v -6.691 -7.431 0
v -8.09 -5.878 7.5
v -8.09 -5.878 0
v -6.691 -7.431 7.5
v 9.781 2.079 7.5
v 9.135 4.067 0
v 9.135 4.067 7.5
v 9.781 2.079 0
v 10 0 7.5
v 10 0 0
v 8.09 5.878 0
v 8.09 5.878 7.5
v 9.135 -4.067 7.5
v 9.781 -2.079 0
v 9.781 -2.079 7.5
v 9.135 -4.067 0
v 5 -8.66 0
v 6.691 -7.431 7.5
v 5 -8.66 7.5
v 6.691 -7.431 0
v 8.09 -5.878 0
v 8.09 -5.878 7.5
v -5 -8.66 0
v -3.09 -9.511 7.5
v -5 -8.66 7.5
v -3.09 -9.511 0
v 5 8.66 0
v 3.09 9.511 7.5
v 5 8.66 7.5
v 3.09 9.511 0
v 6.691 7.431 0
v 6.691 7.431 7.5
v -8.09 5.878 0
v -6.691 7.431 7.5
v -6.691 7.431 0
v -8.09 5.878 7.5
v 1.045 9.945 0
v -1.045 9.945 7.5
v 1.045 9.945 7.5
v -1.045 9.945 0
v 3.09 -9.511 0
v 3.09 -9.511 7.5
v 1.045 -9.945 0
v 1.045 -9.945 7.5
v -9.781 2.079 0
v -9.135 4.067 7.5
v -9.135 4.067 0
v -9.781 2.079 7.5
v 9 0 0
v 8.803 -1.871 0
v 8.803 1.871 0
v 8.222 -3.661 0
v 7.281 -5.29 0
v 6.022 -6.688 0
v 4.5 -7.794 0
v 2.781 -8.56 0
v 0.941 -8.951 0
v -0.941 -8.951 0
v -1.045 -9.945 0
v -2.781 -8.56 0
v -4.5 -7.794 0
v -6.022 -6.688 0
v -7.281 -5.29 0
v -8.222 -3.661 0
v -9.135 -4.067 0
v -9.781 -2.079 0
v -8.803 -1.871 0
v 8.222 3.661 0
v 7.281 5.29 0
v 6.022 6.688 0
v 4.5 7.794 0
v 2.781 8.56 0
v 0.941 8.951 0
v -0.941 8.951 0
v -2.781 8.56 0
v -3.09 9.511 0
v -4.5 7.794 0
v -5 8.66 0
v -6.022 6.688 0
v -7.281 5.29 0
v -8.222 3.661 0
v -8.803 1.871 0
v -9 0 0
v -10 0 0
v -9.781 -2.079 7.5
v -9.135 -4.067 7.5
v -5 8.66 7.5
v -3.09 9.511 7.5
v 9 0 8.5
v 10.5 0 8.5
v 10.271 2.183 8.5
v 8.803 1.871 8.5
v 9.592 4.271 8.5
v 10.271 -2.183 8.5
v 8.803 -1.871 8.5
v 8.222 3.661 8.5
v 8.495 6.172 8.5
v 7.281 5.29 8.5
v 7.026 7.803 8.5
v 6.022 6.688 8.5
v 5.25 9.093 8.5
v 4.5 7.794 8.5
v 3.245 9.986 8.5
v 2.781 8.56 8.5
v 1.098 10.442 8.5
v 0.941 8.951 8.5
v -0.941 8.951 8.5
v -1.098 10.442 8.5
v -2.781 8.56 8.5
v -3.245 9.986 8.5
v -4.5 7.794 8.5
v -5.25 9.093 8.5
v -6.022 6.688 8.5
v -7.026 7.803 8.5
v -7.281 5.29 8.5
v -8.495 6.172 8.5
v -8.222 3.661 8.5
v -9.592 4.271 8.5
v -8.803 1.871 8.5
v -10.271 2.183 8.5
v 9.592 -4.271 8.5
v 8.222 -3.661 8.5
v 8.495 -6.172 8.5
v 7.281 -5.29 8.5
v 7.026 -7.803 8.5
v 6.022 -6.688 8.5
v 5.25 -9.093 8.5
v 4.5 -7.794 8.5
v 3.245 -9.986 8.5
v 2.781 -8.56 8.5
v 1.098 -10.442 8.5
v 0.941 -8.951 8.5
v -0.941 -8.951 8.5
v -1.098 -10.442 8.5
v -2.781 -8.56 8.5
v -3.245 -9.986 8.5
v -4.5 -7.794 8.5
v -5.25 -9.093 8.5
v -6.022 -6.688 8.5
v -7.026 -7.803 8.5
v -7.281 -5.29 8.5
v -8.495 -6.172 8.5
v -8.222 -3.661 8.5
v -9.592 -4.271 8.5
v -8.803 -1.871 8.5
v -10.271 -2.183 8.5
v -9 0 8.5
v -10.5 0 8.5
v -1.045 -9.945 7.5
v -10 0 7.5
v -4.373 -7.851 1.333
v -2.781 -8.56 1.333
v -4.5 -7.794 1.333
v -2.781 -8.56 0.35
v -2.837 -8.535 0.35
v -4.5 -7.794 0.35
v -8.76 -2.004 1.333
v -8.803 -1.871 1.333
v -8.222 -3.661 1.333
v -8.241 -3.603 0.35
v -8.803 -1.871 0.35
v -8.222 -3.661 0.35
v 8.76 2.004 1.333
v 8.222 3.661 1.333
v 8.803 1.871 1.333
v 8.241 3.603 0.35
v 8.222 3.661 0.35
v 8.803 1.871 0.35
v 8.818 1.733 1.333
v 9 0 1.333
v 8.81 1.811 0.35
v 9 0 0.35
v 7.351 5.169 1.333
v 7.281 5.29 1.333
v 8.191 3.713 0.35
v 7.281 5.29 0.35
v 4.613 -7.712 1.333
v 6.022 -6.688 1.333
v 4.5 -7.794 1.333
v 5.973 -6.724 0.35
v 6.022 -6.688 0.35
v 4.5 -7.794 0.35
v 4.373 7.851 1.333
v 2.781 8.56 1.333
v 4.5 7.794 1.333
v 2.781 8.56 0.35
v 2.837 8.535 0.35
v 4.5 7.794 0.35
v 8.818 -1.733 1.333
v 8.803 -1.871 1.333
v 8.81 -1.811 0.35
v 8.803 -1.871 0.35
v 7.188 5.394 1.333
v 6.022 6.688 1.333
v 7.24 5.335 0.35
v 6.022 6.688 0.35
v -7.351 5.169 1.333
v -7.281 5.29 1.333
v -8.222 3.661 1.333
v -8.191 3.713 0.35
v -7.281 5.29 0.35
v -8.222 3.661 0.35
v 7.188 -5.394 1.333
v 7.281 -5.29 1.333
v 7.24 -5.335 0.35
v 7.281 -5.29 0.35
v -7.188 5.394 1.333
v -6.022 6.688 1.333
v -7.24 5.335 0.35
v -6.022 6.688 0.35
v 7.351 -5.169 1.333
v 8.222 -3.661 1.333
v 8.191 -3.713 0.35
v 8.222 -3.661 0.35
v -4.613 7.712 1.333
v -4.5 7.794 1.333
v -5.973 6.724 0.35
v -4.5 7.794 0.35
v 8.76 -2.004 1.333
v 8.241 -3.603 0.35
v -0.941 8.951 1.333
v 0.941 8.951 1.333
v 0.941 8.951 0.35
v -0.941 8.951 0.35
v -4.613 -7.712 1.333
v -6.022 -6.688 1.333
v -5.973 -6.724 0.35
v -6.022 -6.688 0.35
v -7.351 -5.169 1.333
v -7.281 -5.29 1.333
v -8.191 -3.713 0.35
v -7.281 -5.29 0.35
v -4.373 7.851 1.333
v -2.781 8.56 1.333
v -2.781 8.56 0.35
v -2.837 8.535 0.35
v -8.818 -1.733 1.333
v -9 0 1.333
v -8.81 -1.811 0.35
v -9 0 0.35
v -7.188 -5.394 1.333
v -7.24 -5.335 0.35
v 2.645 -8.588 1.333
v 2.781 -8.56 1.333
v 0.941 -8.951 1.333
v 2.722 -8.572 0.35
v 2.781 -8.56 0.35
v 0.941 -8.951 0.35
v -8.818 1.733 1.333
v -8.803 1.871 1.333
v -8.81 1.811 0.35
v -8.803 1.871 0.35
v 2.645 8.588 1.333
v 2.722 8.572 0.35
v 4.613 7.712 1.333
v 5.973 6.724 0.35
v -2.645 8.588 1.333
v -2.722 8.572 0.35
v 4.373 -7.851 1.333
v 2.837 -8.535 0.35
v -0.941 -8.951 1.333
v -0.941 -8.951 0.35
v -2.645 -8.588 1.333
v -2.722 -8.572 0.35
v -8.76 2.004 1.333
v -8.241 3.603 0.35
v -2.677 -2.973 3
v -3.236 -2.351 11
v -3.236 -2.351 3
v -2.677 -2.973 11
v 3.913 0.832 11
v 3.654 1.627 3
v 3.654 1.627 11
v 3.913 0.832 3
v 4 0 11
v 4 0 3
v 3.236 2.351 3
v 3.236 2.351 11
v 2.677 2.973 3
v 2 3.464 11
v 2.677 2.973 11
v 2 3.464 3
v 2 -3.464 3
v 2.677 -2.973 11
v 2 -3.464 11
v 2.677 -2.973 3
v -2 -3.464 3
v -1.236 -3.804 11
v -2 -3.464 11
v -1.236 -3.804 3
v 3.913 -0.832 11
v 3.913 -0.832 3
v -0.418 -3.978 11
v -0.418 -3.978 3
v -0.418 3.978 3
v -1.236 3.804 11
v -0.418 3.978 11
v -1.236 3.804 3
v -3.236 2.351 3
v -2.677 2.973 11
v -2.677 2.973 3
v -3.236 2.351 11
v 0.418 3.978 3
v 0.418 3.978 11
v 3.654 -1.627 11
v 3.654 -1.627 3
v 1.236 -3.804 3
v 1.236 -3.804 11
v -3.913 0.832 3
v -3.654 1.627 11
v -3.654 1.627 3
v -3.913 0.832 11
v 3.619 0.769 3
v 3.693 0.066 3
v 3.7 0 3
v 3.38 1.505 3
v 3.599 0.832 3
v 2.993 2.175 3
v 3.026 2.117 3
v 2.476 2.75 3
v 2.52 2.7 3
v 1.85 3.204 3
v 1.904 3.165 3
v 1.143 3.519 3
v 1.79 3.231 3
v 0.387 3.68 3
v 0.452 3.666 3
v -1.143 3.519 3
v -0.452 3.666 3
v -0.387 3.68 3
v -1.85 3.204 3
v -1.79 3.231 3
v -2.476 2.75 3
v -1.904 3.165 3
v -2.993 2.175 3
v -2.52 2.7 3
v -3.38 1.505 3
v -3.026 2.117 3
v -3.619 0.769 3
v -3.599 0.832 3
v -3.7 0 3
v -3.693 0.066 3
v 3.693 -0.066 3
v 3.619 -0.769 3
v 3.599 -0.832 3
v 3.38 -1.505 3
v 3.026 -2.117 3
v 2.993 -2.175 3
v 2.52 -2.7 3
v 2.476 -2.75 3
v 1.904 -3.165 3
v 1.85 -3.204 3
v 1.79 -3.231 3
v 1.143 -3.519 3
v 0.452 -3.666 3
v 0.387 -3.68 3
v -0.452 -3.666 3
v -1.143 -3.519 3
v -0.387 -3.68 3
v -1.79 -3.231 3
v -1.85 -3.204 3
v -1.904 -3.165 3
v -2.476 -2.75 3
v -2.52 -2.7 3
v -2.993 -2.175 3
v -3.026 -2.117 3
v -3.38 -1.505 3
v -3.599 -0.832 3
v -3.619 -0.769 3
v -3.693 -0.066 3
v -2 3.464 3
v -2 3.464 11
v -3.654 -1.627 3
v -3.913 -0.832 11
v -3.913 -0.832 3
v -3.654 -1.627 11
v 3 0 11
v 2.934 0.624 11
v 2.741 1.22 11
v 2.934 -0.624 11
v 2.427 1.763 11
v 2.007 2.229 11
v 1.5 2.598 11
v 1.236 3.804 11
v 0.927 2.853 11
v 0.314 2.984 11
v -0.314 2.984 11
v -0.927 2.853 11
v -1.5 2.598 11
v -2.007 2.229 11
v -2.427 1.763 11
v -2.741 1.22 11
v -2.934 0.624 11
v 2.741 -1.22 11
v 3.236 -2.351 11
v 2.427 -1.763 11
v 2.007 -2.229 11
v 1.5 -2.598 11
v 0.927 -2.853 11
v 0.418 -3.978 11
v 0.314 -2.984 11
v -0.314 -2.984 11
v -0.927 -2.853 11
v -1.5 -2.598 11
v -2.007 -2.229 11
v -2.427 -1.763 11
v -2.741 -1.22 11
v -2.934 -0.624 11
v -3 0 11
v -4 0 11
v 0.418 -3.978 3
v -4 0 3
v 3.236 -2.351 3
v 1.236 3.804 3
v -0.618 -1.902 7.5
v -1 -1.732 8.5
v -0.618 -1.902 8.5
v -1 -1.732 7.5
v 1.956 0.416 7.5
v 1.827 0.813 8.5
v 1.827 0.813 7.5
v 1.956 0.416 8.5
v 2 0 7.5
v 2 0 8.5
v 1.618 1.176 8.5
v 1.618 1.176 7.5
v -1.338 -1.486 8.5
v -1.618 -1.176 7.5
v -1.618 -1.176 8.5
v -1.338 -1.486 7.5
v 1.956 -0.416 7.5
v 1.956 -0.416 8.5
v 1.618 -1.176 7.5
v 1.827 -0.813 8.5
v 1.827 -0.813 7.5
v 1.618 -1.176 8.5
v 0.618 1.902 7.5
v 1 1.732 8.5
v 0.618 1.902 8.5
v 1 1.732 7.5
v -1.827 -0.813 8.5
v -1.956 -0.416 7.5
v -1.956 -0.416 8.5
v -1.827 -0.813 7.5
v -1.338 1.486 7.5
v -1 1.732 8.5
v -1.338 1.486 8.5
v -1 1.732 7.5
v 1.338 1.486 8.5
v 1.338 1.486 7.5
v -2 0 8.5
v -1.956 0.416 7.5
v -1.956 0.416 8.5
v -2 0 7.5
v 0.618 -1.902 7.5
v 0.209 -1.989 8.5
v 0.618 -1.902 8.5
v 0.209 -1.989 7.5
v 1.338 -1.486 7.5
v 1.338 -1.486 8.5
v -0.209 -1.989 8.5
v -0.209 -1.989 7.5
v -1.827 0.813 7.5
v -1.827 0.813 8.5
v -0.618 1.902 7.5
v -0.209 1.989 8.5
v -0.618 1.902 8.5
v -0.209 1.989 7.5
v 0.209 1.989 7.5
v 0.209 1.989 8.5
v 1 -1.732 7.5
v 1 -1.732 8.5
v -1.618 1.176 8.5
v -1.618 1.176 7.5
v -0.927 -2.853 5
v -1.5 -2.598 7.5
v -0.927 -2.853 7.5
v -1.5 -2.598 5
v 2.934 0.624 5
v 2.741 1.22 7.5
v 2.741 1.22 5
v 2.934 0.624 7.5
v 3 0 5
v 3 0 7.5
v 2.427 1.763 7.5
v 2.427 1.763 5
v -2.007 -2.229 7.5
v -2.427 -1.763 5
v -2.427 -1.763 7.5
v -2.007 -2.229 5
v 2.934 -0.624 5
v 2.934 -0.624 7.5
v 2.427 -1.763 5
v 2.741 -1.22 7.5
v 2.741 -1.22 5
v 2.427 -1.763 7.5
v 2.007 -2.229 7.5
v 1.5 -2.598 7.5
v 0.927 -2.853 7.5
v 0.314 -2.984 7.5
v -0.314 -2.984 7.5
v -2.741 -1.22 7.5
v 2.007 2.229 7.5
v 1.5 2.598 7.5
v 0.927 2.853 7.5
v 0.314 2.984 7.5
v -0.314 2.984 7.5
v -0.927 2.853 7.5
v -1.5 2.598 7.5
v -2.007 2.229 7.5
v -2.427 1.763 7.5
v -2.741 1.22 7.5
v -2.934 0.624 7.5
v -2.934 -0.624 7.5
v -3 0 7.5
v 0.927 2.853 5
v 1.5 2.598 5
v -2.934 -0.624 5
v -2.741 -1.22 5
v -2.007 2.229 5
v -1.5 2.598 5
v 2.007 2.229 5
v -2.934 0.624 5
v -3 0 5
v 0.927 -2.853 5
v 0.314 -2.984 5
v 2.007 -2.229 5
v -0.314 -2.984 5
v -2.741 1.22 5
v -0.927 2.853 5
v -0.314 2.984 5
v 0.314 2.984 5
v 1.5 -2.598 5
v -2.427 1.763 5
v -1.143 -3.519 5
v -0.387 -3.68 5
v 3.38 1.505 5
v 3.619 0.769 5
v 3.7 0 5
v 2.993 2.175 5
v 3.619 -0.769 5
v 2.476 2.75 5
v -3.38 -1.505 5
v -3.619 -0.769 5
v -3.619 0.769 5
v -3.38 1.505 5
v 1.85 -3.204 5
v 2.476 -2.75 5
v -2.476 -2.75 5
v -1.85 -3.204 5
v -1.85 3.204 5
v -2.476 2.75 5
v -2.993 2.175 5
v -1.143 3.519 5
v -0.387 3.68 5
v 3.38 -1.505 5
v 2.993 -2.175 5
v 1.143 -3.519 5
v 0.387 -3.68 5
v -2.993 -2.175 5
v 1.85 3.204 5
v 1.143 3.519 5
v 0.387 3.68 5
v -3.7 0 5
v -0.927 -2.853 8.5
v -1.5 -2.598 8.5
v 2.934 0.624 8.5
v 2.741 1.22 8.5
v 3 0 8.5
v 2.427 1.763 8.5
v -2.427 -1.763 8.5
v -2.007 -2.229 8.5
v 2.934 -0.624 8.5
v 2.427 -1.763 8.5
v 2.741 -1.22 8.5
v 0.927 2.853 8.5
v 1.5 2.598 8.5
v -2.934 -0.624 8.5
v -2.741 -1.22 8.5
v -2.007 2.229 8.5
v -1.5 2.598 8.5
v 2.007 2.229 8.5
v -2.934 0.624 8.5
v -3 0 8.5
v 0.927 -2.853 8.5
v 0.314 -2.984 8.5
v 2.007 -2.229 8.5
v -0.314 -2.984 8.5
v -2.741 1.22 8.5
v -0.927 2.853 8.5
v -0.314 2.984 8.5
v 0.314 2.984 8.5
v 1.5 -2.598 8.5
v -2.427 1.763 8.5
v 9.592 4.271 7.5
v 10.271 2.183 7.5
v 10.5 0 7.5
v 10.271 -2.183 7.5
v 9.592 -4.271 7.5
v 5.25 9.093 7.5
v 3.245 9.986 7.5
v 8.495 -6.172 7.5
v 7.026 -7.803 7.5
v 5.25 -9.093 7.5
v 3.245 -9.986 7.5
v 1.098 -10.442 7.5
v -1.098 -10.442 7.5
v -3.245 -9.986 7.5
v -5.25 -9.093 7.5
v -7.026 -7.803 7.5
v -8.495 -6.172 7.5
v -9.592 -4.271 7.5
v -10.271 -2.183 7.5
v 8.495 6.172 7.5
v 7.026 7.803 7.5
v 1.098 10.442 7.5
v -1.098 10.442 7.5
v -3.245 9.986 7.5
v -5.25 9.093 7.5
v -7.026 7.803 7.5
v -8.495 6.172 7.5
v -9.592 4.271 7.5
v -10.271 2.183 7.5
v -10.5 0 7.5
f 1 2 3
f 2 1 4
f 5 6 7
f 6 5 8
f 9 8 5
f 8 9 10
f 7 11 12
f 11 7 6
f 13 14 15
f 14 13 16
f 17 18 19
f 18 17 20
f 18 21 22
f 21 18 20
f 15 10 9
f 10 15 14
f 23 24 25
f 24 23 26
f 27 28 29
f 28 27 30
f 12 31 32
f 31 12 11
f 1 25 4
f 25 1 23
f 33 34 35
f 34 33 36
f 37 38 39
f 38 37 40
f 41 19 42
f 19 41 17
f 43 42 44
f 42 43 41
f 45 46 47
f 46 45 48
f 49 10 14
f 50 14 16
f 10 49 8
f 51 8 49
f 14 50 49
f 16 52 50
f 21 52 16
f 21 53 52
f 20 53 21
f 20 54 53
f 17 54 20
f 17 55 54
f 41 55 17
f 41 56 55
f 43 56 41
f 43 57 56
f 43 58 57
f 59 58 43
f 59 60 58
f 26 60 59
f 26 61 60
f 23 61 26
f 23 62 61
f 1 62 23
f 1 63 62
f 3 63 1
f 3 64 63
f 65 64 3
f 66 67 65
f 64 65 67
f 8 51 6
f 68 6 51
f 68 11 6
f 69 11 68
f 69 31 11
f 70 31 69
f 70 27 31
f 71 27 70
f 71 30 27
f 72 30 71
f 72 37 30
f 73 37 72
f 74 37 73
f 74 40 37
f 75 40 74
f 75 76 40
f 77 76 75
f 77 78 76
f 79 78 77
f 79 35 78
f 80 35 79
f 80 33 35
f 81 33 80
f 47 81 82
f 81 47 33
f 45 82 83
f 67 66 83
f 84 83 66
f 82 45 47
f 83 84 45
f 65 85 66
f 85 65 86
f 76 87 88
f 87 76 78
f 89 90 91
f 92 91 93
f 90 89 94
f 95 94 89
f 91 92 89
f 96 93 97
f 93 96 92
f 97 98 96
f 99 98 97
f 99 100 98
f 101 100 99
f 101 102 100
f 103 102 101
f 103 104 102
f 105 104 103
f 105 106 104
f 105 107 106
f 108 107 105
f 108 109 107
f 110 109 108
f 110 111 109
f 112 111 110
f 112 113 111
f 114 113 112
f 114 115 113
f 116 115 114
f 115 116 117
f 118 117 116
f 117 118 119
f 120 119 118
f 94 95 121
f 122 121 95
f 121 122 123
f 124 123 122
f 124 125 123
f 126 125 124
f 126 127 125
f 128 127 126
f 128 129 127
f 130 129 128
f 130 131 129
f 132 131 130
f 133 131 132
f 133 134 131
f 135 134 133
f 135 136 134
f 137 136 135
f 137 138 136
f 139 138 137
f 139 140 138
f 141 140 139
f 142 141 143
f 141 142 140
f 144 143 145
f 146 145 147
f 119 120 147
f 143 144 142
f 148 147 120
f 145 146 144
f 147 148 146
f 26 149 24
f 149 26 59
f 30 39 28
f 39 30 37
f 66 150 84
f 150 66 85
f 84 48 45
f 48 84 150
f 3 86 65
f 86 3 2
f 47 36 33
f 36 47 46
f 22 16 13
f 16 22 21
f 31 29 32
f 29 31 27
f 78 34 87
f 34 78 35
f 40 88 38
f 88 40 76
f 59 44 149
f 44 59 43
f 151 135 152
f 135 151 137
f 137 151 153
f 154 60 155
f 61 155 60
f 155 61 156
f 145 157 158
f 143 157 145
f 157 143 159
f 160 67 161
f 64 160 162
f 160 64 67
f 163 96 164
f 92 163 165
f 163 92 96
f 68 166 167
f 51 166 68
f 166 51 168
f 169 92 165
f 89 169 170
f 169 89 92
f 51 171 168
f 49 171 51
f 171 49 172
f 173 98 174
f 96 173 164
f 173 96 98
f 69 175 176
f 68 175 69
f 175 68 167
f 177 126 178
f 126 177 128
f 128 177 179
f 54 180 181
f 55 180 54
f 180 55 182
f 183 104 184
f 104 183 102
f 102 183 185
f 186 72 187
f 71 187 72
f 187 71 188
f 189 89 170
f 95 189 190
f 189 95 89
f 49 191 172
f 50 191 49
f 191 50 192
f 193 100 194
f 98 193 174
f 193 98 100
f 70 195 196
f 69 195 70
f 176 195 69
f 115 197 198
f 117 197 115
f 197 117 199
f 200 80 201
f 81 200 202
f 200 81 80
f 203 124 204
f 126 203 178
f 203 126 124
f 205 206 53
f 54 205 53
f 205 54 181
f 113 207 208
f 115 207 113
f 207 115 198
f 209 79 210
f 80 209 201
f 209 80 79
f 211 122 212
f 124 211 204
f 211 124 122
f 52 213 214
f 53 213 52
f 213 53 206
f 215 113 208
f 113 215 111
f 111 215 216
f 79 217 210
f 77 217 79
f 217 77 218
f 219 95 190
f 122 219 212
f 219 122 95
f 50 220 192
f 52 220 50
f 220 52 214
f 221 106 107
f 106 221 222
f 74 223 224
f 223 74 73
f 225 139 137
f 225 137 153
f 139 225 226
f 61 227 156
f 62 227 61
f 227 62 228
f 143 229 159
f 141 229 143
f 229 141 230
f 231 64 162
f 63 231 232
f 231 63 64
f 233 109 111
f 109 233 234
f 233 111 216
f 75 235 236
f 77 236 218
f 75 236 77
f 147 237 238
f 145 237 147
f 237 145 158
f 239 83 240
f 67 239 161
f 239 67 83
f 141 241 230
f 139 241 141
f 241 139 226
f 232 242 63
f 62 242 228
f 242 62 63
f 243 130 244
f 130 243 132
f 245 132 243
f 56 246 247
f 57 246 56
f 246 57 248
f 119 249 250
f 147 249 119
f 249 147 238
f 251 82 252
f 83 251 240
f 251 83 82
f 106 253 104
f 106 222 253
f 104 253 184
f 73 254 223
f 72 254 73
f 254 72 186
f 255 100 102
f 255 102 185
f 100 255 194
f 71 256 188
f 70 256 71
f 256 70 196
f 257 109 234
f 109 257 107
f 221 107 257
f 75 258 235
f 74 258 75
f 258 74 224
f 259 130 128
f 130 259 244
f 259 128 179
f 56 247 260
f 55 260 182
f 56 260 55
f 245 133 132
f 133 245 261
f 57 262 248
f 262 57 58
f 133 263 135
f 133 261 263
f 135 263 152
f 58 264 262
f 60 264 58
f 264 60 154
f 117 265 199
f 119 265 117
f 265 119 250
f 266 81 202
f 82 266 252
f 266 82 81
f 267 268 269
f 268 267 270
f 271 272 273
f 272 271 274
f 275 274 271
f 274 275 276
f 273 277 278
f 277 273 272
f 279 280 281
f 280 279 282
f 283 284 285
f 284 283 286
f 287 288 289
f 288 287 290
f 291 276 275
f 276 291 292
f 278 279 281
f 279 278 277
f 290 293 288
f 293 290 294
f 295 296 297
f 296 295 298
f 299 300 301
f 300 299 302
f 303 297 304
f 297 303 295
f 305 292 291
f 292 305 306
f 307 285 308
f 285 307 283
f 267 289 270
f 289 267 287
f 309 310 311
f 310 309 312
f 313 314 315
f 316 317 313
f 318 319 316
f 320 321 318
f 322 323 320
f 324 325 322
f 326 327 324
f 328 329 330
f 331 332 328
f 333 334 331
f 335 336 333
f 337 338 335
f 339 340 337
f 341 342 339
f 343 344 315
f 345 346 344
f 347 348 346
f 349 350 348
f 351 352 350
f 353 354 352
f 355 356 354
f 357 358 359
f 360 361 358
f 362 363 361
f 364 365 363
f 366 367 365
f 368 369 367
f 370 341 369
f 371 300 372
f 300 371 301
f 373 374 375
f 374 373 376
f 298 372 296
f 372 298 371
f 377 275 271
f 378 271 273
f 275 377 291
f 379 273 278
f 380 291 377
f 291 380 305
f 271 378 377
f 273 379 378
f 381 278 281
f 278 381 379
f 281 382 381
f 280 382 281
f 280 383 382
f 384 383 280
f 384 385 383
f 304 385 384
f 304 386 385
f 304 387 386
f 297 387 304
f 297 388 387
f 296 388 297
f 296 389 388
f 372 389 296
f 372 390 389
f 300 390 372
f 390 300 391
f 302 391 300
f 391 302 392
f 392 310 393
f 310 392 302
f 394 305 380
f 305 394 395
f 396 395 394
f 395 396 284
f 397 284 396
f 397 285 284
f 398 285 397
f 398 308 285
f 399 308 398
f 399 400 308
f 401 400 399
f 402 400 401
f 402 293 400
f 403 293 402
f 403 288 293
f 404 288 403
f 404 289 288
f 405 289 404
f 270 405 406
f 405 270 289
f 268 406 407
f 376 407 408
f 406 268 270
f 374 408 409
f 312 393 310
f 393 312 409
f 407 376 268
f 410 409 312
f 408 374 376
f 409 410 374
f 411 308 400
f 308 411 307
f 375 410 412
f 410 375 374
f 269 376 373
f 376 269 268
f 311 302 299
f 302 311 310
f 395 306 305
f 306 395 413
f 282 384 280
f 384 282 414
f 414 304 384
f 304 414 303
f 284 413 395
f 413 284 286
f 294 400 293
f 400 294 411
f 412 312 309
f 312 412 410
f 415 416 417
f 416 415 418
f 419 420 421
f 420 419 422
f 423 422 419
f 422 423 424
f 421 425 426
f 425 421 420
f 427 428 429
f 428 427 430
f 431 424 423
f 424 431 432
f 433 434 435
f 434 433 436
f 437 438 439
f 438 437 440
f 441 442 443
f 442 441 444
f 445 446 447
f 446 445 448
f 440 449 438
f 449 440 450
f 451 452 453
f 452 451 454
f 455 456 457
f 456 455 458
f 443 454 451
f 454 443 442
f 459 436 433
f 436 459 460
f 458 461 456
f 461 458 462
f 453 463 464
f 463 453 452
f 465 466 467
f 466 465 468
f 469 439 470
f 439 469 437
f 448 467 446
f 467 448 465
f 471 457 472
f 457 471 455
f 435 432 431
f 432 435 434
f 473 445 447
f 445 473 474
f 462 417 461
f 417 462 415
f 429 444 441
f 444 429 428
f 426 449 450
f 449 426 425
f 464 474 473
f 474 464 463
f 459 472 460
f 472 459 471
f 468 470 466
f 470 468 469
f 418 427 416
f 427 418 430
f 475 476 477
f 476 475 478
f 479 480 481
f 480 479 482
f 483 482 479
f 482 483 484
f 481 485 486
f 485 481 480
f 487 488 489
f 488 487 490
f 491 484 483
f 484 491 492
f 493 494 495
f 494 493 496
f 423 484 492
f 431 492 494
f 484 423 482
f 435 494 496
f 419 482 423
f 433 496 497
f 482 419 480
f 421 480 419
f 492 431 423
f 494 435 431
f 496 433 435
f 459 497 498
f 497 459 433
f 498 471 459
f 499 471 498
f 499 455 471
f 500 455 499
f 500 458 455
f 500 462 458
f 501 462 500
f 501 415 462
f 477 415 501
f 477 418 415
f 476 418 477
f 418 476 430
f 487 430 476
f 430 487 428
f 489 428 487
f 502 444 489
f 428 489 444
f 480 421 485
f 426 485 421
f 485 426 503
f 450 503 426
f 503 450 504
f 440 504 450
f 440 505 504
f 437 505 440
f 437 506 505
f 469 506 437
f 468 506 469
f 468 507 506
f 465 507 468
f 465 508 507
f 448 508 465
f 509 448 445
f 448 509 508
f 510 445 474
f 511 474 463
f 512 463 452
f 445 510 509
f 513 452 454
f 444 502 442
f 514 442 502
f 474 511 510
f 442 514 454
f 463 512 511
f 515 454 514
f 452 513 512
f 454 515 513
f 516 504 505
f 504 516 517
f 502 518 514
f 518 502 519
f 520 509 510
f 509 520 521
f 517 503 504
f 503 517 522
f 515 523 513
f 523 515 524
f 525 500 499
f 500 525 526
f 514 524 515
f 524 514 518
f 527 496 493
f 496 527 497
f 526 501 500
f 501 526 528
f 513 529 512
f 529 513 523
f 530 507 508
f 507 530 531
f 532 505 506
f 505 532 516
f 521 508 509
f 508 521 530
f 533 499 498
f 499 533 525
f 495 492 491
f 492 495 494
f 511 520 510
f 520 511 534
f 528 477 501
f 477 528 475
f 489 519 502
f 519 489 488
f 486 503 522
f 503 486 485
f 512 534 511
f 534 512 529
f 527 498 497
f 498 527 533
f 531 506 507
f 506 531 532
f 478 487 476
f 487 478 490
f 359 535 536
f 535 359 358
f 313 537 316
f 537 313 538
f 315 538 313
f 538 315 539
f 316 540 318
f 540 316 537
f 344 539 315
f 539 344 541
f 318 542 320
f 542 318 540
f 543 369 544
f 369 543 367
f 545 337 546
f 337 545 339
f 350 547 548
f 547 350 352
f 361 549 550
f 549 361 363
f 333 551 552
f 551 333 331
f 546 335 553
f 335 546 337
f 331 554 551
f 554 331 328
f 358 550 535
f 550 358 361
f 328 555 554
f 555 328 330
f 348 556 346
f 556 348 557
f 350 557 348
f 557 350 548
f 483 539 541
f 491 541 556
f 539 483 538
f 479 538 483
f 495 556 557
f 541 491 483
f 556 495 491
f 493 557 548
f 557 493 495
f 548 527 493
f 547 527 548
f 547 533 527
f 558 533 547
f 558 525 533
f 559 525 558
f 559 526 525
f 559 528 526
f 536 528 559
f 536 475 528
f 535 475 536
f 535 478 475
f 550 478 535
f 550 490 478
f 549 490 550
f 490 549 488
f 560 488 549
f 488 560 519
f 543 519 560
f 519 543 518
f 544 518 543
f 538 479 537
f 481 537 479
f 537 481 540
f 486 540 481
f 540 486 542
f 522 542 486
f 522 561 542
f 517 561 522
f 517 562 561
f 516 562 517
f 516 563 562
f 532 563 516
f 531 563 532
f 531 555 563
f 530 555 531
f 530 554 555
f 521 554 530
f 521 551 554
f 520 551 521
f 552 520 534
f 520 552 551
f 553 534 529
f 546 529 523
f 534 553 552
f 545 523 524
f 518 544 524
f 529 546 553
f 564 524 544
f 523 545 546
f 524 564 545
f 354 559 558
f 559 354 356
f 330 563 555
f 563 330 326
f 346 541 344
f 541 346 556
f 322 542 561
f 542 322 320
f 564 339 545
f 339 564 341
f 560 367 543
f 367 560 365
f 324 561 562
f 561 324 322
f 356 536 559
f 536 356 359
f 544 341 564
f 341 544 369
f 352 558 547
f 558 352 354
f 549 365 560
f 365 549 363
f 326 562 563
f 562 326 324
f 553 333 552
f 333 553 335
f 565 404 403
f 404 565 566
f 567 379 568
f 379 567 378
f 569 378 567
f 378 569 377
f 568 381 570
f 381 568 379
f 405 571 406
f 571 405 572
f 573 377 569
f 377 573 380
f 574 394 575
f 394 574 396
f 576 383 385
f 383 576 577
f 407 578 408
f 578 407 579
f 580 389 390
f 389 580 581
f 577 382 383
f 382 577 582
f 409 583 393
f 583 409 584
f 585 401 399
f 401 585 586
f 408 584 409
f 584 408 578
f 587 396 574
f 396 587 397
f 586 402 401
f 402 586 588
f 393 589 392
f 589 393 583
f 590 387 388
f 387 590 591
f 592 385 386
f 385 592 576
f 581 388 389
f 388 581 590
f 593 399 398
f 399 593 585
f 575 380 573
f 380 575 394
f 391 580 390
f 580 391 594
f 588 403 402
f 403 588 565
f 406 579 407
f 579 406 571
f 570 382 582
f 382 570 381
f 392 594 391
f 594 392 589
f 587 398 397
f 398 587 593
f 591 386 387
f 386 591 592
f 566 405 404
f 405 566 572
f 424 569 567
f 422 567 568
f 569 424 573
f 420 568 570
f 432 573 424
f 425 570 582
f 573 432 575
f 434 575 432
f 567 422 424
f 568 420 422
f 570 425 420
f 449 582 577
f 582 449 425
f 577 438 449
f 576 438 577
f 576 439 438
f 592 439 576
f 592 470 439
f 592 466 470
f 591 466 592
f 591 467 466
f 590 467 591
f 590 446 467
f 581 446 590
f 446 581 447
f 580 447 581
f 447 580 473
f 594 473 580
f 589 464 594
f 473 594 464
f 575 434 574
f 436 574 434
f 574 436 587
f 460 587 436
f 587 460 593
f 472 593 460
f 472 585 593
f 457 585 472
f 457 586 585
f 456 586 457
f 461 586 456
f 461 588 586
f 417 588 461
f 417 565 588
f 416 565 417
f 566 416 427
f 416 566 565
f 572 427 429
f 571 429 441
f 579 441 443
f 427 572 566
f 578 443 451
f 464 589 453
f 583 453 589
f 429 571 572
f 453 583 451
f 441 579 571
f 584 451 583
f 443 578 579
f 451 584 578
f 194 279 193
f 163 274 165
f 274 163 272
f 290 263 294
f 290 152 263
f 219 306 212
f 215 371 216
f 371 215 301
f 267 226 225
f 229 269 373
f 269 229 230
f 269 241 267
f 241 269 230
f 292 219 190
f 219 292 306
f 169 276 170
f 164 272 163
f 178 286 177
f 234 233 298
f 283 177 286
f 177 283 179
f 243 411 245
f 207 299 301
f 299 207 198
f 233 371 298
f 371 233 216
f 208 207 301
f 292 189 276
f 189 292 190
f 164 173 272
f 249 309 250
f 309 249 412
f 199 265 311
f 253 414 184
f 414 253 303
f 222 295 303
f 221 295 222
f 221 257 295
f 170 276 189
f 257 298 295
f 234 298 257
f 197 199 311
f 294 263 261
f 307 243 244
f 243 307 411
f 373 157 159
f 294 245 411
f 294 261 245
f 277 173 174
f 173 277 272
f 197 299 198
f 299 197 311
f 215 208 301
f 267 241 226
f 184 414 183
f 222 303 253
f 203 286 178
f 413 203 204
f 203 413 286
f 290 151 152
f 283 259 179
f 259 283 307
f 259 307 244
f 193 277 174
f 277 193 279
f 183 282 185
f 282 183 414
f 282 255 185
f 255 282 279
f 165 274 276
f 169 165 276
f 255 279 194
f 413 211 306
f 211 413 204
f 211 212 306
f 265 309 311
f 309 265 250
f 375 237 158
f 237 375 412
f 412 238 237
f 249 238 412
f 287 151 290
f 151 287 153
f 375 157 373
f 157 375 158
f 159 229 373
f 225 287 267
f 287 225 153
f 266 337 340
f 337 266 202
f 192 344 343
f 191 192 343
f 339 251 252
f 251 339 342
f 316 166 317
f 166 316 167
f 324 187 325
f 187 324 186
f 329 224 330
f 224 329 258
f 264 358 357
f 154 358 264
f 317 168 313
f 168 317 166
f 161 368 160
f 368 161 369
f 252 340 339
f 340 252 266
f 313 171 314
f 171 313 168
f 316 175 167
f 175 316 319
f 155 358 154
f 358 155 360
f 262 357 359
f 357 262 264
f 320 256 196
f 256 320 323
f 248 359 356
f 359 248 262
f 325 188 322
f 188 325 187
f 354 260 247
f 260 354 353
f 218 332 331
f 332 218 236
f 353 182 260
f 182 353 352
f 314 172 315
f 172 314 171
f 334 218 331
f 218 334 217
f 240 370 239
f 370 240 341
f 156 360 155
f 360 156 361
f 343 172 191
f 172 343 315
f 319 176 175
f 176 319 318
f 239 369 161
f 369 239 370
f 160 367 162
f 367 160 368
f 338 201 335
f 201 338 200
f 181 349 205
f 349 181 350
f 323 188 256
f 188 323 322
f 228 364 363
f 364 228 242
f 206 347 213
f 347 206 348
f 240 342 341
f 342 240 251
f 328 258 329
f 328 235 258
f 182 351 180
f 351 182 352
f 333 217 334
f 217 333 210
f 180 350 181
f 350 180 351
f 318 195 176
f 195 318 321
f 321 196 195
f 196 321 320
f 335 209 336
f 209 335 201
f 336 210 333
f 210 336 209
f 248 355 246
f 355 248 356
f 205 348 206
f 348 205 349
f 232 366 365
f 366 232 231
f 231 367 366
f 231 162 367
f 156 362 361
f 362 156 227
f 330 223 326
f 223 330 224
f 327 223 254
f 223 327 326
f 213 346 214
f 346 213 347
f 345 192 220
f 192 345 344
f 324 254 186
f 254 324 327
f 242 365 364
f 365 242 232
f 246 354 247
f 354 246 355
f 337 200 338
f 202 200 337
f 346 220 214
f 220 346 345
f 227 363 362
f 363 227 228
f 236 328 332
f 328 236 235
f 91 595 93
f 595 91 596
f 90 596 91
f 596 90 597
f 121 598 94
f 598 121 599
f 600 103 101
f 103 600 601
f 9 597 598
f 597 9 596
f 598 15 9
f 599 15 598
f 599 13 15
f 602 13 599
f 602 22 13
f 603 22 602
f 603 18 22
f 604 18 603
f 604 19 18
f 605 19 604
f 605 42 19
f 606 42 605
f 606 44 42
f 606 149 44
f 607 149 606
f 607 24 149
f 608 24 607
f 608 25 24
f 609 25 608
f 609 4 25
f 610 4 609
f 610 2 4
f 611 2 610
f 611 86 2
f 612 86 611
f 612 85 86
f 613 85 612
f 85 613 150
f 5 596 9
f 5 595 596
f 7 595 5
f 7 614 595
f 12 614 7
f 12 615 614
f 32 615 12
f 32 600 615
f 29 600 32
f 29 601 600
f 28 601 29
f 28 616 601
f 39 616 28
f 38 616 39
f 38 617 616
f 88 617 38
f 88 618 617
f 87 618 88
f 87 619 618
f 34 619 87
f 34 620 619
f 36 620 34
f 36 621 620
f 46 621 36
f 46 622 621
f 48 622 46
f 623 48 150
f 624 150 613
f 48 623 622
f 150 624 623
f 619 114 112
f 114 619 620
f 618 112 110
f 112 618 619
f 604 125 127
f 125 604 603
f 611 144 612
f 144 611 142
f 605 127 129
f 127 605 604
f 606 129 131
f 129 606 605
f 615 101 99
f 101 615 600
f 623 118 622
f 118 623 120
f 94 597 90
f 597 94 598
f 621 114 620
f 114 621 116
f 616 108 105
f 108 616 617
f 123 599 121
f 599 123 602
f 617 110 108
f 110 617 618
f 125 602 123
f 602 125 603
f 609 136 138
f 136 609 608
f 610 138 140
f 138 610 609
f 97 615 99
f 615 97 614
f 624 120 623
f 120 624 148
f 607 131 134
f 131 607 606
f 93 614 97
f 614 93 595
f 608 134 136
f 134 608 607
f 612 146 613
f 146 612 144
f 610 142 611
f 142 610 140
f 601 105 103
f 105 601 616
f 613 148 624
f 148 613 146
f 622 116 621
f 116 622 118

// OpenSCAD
//Miniz 
$fs=0.01;

module wheel_axis(){
  difference(){
    cylinder(h=8.5, r=10);
    translate([0,0,-1])
    cylinder(h=10, r=9);
  }
  translate([0,0,3])
  difference(){
    cylinder(h=8, r=4);
    cylinder(h=9, r=2);
    translate([0,0,-1])cylinder(h=1+2+2.5,r=3);
    translate([0,0,-1])cylinder(h=1+2,r=3.7);
    translate([0,0,2+2.5+1])cylinder(h=3.5,r=3);
  }
}

module wheel(){
  wheel_axis();
  difference(){
  hull(){
    cylinder(h=1,r=10);
    translate([0,0,2]) cylinder(h=1,r=4);
  }
  hull(){
    translate([0,0,-0.1]) cylinder(h=0.2,r=19/2);
    translate([0,0,2.1]) cylinder(h=1,r=7/2);
  }
  }
  difference(){
    translate([0,0,7.5]) cylinder(h=1, r=21/2);
    translate([0,0,7]) cylinder(h=2, r=18/2);
  }
}

color("white") wheel();
